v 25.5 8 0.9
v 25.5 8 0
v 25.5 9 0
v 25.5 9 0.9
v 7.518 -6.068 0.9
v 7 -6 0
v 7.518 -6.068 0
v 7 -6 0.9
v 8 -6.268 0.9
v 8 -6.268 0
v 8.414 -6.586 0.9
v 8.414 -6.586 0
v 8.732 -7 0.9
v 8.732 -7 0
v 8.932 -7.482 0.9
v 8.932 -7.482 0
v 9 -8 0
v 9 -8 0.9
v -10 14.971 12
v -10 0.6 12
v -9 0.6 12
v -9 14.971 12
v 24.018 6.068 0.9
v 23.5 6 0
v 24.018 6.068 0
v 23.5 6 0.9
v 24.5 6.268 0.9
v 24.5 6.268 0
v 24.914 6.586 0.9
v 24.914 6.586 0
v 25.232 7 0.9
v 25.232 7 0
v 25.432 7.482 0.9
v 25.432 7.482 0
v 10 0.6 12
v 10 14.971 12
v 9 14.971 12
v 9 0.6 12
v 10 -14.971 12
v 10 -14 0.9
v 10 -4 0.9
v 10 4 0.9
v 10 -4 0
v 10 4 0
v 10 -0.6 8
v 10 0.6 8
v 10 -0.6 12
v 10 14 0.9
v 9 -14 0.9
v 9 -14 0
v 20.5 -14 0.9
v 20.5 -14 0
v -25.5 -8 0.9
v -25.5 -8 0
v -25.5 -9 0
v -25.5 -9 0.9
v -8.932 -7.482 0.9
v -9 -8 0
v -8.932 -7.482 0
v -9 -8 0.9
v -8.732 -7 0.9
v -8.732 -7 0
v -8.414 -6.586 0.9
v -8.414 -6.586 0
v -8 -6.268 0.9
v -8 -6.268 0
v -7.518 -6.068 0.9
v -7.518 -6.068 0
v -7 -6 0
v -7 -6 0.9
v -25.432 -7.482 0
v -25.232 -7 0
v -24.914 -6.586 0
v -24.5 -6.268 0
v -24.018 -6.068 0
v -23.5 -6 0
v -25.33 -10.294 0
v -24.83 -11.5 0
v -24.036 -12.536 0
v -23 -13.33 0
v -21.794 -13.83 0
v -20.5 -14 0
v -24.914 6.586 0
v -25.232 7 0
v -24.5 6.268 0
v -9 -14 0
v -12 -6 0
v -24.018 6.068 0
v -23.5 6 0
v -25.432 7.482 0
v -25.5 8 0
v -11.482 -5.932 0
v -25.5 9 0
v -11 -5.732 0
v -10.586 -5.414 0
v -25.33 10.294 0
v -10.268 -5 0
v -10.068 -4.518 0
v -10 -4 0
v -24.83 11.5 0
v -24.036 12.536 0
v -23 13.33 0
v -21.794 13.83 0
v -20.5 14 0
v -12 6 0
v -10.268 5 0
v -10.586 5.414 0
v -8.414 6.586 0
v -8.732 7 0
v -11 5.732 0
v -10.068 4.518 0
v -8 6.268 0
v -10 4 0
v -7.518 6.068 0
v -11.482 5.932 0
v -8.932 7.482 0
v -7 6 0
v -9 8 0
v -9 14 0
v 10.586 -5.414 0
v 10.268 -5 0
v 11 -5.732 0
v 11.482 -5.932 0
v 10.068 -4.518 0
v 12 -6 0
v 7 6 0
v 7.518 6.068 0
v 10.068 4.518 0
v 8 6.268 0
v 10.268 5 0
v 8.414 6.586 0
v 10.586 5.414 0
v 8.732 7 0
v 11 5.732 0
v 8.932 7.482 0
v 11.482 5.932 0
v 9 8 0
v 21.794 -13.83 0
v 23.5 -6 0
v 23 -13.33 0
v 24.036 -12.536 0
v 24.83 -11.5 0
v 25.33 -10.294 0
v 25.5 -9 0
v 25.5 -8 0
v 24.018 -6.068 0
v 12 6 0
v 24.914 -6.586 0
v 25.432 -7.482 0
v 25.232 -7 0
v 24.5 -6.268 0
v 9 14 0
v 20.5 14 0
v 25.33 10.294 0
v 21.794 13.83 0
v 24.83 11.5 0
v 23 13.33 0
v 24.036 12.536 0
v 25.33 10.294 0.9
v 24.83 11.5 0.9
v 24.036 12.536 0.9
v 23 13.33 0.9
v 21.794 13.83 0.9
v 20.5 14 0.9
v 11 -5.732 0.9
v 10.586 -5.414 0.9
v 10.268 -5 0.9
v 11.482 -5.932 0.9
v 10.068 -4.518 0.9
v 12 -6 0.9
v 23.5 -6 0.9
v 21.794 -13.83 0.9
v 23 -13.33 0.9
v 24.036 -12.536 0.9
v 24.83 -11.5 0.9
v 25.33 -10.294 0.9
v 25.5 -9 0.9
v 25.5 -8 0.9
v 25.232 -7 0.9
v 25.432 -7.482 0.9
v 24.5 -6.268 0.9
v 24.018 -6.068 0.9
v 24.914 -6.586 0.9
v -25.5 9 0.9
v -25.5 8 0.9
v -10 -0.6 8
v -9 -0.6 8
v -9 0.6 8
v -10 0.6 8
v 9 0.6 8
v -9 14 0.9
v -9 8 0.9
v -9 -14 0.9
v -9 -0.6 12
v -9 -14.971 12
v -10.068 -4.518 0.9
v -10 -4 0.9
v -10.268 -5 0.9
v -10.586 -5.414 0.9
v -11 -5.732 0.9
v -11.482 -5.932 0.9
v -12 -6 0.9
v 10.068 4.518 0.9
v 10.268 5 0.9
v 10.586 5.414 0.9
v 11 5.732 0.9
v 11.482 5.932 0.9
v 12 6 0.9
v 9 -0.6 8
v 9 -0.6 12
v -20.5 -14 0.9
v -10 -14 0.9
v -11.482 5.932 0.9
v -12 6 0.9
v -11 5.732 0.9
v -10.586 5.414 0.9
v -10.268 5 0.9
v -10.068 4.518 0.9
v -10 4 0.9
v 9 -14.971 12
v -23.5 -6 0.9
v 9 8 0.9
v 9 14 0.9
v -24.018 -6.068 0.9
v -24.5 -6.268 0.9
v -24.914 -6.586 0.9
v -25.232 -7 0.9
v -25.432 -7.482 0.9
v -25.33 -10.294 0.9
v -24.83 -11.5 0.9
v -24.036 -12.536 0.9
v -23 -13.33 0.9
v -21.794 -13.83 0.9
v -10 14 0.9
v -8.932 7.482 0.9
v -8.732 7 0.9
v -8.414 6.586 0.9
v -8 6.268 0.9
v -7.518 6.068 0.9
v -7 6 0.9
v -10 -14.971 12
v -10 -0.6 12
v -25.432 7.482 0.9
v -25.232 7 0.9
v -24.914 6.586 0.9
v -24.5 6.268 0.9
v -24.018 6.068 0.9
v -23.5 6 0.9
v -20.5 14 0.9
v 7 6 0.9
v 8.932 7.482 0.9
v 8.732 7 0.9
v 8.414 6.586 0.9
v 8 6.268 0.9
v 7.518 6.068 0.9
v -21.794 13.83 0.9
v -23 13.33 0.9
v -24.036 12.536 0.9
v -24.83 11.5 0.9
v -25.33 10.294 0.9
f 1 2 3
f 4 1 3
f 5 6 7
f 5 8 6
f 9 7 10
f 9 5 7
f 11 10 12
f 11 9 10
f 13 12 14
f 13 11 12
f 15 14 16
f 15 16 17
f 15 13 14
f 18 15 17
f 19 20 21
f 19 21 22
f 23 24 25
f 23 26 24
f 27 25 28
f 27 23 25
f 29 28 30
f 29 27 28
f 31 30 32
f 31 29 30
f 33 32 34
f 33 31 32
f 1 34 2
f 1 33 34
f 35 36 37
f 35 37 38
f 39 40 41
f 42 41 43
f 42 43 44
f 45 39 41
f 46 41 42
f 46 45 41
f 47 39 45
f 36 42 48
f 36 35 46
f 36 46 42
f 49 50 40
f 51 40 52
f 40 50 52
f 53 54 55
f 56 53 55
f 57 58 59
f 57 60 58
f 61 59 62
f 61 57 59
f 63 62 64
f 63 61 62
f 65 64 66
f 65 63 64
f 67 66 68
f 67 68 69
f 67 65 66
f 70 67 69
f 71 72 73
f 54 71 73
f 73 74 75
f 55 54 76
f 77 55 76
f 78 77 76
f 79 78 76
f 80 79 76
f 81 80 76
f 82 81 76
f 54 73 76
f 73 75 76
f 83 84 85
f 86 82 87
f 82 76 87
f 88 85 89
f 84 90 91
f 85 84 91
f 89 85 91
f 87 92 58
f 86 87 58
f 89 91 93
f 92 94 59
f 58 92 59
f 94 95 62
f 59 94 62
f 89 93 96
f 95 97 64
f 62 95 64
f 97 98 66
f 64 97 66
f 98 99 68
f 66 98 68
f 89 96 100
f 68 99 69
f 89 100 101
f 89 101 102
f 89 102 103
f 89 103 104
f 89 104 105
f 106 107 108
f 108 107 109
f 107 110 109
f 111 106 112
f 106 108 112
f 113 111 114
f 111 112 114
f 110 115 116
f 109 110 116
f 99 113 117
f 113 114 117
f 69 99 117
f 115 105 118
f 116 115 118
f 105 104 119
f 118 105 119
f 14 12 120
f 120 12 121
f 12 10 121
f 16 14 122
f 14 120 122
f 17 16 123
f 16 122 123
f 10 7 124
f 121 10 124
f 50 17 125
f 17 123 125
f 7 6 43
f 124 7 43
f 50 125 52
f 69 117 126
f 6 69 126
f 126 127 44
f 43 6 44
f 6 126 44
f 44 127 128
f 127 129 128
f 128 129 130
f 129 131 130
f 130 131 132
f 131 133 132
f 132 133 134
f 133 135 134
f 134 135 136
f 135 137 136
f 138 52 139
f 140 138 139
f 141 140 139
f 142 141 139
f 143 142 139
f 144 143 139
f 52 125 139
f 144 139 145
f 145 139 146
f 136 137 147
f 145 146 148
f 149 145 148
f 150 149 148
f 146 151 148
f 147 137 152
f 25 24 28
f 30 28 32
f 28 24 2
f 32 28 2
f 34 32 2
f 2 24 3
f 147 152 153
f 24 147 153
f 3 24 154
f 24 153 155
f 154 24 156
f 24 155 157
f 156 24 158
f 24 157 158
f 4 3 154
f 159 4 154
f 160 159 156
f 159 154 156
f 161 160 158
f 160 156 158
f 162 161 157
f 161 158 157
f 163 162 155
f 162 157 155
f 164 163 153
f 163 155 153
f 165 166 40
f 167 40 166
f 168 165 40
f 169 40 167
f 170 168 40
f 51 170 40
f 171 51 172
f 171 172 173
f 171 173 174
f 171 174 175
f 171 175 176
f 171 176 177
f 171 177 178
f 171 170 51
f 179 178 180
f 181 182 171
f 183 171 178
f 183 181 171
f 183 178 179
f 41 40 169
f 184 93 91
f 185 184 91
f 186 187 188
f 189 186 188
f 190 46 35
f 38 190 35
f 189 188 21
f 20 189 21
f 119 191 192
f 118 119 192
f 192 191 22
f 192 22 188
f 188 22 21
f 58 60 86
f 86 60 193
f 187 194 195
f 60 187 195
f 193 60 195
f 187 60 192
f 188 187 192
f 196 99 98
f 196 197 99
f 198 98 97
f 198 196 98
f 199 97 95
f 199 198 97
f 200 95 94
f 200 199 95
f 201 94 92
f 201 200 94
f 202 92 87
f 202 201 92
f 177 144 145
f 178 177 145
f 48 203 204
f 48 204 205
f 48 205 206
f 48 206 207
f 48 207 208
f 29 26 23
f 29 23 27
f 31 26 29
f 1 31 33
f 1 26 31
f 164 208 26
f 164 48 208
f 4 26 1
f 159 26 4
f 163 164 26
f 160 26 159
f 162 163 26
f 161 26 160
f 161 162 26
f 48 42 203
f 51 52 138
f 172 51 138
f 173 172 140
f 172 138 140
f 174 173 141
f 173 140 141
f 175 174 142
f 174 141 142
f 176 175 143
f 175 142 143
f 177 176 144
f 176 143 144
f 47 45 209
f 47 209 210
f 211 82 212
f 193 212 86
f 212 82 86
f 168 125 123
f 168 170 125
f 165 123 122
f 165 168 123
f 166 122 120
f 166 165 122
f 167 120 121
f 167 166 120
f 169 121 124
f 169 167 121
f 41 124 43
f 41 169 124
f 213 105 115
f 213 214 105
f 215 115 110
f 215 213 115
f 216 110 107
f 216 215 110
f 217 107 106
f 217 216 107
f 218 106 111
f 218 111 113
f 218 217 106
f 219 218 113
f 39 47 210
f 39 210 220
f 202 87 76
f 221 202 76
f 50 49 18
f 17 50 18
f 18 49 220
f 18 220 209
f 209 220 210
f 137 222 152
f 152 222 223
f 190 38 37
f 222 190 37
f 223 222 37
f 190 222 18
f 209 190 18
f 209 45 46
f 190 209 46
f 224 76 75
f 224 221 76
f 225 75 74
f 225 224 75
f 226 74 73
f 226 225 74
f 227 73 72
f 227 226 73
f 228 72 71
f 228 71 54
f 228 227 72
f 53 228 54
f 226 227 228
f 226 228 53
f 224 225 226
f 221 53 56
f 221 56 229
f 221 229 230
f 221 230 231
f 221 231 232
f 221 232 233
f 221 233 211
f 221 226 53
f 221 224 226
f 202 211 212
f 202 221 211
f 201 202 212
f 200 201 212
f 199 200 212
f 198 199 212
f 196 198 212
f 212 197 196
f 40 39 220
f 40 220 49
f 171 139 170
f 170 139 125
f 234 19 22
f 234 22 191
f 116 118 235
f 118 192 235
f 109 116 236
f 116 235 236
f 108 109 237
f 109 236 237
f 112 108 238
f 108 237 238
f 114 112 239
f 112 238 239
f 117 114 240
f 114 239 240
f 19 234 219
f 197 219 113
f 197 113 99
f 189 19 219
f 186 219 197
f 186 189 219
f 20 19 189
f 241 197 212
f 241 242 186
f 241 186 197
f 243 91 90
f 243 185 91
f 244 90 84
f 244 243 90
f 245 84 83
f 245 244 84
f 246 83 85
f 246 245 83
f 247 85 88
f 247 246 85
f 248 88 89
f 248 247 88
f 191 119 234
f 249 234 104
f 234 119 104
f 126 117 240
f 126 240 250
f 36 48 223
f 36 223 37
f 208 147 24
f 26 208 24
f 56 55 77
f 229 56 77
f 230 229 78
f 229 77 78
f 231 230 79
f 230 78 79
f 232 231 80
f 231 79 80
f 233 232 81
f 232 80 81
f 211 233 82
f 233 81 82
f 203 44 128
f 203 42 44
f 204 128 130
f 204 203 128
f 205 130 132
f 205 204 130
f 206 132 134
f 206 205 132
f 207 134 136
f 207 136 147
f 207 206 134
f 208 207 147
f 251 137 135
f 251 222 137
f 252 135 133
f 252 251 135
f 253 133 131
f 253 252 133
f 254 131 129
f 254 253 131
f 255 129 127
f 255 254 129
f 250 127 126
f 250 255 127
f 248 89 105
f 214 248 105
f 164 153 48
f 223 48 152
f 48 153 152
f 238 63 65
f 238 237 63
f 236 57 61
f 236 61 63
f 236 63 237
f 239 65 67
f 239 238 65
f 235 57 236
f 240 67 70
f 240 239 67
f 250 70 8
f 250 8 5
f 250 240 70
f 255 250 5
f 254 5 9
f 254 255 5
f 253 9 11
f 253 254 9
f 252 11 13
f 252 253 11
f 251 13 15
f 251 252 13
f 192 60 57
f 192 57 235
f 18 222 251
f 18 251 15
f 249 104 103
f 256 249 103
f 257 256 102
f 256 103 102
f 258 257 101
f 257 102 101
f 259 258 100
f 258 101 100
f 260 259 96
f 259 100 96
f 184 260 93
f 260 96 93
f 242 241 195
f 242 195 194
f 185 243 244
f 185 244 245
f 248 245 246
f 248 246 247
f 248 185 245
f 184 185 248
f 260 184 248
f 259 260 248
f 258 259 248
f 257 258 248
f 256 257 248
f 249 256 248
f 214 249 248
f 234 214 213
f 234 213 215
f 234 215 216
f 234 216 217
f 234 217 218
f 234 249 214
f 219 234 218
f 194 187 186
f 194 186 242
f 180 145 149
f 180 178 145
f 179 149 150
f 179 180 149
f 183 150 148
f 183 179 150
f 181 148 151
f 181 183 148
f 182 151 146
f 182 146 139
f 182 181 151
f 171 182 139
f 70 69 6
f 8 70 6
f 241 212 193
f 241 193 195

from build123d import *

# Parameters (mm, degrees)
F0_W     = 1
F0_H     = 8
F0_H_2   = 12
F0_W_2   = 18
F1_DEPTH = 0.9
F2_DEPTH = 12
F3_R     = 2
F5_DEPTH = 1
F7_DEPTH = 1
F8_W     = 1.2
F8_H     = 4
F9_DEPTH = 25


with BuildPart() as f1:
    # F0 (on Top) → F1 (new body)
    with BuildSketch(Plane.XY):
        with BuildLine():
            Line((-10, 14), (-20.5, 14))
            ThreePointArc((-20.5, 14), (-24.0355339059, 12.5355339059), (-25.5, 9))
            Line((-25.5, 9), (-25.5, 6))
            Line((-25.5, 6), (-10, 6))
            Line((-10, 6), (-10, 14))
        make_face()
        with Locations((-9.5, 10)):
            Rectangle(F0_W, F0_H)
        with Locations((-9.5, 0)):
            Rectangle(F0_W, F0_H_2)
        with Locations((-9.5, -10)):
            Rectangle(F0_W, F0_H)
        with BuildLine():
            Line((-10, -14), (-10, -6))
            Line((-10, -6), (-25.5, -6))
            Line((-25.5, -6), (-25.5, -9))
            ThreePointArc((-25.5, -9), (-24.0355339059, -12.5355339059), (-20.5, -14))
            Line((-20.5, -14), (-10, -14))
        make_face()
        with BuildLine():
            Line((25.5, -6), (10, -6))
            Line((10, -6), (10, -14))
            Line((10, -14), (20.5, -14))
            ThreePointArc((20.5, -14), (24.0355339059, -12.5355339059), (25.5, -9))
            Line((25.5, -9), (25.5, -6))
        make_face()
        with BuildLine():
            Line((20.5, 14), (10, 14))
            Line((10, 14), (10, 6))
            Line((10, 6), (25.5, 6))
            Line((25.5, 6), (25.5, 9))
            ThreePointArc((25.5, 9), (24.0355339059, 12.5355339059), (20.5, 14))
        make_face()
        with Locations((9.5, 10)):
            Rectangle(F0_W, F0_H)
        with Locations((9.5, 0)):
            Rectangle(F0_W, F0_H_2)
        with Locations((9.5, -10)):
            Rectangle(F0_W, F0_H)
        Rectangle(F0_W_2, F0_H_2)
    extrude(amount=F1_DEPTH)

    # F0 (on Top) → F2 (join)
    with BuildSketch(Plane.XY):
        with Locations((-9.5, -10)):
            Rectangle(F0_W, F0_H)
        with Locations((-9.5, 0)):
            Rectangle(F0_W, F0_H_2)
        with Locations((-9.5, 10)):
            Rectangle(F0_W, F0_H)
        with Locations((9.5, 10)):
            Rectangle(F0_W, F0_H)
        with Locations((9.5, 0)):
            Rectangle(F0_W, F0_H_2)
        with Locations((9.5, -10)):
            Rectangle(F0_W, F0_H)
    extrude(amount=F2_DEPTH)

    # F3
    f3_edges = [f1.edges().sort_by_distance(p)[0] for p in [
        (-25.5, 6, 0.45),
        (-10, 6, 0.45),
        (-10, -6, 0.45),
        (-25.5, -6, 0.45),
        (-9, 6, 0.45),
        (9, 6, 0.45),
        (25.5, 6, 0.45),
        (25.5, -6, 0.45),
        (10, 6, 0.45),
        (10, -6, 0.45),
        (9, -6, 0.45),
        (-9, -6, 0.45),
    ]]
    fillet(f3_edges, radius=F3_R)

    # F4 (on face) → F5 (join)
    with BuildSketch(Plane.YZ.offset(10)):
        Polygon((-14.9711241651, 12), (-14, 0.9), (-14, 12), align=None)
        Polygon((14.9711241651, 12), (14, 12), (14, 0.9), align=None)
    extrude(amount=-F5_DEPTH)

    # F6 (on face) → F7 (join)
    with BuildSketch(Plane(origin=(-10, 0, 0), x_dir=(0, -1, 0), z_dir=(-1, 0, 0))):
        Polygon((-14, 0.9), (-14, 12), (-14.9711241651, 12), align=None)
        Polygon((14.9711241651, 12), (14, 12), (14, 0.9), align=None)
    extrude(amount=-F7_DEPTH)

    # F8 (on face) → F9 (cut)
    with BuildSketch(Plane.YZ.offset(10)):
        with Locations((0, 10)):
            Rectangle(F8_W, F8_H)
    extrude(amount=-F9_DEPTH, mode=Mode.SUBTRACT)


solid = f1.part
